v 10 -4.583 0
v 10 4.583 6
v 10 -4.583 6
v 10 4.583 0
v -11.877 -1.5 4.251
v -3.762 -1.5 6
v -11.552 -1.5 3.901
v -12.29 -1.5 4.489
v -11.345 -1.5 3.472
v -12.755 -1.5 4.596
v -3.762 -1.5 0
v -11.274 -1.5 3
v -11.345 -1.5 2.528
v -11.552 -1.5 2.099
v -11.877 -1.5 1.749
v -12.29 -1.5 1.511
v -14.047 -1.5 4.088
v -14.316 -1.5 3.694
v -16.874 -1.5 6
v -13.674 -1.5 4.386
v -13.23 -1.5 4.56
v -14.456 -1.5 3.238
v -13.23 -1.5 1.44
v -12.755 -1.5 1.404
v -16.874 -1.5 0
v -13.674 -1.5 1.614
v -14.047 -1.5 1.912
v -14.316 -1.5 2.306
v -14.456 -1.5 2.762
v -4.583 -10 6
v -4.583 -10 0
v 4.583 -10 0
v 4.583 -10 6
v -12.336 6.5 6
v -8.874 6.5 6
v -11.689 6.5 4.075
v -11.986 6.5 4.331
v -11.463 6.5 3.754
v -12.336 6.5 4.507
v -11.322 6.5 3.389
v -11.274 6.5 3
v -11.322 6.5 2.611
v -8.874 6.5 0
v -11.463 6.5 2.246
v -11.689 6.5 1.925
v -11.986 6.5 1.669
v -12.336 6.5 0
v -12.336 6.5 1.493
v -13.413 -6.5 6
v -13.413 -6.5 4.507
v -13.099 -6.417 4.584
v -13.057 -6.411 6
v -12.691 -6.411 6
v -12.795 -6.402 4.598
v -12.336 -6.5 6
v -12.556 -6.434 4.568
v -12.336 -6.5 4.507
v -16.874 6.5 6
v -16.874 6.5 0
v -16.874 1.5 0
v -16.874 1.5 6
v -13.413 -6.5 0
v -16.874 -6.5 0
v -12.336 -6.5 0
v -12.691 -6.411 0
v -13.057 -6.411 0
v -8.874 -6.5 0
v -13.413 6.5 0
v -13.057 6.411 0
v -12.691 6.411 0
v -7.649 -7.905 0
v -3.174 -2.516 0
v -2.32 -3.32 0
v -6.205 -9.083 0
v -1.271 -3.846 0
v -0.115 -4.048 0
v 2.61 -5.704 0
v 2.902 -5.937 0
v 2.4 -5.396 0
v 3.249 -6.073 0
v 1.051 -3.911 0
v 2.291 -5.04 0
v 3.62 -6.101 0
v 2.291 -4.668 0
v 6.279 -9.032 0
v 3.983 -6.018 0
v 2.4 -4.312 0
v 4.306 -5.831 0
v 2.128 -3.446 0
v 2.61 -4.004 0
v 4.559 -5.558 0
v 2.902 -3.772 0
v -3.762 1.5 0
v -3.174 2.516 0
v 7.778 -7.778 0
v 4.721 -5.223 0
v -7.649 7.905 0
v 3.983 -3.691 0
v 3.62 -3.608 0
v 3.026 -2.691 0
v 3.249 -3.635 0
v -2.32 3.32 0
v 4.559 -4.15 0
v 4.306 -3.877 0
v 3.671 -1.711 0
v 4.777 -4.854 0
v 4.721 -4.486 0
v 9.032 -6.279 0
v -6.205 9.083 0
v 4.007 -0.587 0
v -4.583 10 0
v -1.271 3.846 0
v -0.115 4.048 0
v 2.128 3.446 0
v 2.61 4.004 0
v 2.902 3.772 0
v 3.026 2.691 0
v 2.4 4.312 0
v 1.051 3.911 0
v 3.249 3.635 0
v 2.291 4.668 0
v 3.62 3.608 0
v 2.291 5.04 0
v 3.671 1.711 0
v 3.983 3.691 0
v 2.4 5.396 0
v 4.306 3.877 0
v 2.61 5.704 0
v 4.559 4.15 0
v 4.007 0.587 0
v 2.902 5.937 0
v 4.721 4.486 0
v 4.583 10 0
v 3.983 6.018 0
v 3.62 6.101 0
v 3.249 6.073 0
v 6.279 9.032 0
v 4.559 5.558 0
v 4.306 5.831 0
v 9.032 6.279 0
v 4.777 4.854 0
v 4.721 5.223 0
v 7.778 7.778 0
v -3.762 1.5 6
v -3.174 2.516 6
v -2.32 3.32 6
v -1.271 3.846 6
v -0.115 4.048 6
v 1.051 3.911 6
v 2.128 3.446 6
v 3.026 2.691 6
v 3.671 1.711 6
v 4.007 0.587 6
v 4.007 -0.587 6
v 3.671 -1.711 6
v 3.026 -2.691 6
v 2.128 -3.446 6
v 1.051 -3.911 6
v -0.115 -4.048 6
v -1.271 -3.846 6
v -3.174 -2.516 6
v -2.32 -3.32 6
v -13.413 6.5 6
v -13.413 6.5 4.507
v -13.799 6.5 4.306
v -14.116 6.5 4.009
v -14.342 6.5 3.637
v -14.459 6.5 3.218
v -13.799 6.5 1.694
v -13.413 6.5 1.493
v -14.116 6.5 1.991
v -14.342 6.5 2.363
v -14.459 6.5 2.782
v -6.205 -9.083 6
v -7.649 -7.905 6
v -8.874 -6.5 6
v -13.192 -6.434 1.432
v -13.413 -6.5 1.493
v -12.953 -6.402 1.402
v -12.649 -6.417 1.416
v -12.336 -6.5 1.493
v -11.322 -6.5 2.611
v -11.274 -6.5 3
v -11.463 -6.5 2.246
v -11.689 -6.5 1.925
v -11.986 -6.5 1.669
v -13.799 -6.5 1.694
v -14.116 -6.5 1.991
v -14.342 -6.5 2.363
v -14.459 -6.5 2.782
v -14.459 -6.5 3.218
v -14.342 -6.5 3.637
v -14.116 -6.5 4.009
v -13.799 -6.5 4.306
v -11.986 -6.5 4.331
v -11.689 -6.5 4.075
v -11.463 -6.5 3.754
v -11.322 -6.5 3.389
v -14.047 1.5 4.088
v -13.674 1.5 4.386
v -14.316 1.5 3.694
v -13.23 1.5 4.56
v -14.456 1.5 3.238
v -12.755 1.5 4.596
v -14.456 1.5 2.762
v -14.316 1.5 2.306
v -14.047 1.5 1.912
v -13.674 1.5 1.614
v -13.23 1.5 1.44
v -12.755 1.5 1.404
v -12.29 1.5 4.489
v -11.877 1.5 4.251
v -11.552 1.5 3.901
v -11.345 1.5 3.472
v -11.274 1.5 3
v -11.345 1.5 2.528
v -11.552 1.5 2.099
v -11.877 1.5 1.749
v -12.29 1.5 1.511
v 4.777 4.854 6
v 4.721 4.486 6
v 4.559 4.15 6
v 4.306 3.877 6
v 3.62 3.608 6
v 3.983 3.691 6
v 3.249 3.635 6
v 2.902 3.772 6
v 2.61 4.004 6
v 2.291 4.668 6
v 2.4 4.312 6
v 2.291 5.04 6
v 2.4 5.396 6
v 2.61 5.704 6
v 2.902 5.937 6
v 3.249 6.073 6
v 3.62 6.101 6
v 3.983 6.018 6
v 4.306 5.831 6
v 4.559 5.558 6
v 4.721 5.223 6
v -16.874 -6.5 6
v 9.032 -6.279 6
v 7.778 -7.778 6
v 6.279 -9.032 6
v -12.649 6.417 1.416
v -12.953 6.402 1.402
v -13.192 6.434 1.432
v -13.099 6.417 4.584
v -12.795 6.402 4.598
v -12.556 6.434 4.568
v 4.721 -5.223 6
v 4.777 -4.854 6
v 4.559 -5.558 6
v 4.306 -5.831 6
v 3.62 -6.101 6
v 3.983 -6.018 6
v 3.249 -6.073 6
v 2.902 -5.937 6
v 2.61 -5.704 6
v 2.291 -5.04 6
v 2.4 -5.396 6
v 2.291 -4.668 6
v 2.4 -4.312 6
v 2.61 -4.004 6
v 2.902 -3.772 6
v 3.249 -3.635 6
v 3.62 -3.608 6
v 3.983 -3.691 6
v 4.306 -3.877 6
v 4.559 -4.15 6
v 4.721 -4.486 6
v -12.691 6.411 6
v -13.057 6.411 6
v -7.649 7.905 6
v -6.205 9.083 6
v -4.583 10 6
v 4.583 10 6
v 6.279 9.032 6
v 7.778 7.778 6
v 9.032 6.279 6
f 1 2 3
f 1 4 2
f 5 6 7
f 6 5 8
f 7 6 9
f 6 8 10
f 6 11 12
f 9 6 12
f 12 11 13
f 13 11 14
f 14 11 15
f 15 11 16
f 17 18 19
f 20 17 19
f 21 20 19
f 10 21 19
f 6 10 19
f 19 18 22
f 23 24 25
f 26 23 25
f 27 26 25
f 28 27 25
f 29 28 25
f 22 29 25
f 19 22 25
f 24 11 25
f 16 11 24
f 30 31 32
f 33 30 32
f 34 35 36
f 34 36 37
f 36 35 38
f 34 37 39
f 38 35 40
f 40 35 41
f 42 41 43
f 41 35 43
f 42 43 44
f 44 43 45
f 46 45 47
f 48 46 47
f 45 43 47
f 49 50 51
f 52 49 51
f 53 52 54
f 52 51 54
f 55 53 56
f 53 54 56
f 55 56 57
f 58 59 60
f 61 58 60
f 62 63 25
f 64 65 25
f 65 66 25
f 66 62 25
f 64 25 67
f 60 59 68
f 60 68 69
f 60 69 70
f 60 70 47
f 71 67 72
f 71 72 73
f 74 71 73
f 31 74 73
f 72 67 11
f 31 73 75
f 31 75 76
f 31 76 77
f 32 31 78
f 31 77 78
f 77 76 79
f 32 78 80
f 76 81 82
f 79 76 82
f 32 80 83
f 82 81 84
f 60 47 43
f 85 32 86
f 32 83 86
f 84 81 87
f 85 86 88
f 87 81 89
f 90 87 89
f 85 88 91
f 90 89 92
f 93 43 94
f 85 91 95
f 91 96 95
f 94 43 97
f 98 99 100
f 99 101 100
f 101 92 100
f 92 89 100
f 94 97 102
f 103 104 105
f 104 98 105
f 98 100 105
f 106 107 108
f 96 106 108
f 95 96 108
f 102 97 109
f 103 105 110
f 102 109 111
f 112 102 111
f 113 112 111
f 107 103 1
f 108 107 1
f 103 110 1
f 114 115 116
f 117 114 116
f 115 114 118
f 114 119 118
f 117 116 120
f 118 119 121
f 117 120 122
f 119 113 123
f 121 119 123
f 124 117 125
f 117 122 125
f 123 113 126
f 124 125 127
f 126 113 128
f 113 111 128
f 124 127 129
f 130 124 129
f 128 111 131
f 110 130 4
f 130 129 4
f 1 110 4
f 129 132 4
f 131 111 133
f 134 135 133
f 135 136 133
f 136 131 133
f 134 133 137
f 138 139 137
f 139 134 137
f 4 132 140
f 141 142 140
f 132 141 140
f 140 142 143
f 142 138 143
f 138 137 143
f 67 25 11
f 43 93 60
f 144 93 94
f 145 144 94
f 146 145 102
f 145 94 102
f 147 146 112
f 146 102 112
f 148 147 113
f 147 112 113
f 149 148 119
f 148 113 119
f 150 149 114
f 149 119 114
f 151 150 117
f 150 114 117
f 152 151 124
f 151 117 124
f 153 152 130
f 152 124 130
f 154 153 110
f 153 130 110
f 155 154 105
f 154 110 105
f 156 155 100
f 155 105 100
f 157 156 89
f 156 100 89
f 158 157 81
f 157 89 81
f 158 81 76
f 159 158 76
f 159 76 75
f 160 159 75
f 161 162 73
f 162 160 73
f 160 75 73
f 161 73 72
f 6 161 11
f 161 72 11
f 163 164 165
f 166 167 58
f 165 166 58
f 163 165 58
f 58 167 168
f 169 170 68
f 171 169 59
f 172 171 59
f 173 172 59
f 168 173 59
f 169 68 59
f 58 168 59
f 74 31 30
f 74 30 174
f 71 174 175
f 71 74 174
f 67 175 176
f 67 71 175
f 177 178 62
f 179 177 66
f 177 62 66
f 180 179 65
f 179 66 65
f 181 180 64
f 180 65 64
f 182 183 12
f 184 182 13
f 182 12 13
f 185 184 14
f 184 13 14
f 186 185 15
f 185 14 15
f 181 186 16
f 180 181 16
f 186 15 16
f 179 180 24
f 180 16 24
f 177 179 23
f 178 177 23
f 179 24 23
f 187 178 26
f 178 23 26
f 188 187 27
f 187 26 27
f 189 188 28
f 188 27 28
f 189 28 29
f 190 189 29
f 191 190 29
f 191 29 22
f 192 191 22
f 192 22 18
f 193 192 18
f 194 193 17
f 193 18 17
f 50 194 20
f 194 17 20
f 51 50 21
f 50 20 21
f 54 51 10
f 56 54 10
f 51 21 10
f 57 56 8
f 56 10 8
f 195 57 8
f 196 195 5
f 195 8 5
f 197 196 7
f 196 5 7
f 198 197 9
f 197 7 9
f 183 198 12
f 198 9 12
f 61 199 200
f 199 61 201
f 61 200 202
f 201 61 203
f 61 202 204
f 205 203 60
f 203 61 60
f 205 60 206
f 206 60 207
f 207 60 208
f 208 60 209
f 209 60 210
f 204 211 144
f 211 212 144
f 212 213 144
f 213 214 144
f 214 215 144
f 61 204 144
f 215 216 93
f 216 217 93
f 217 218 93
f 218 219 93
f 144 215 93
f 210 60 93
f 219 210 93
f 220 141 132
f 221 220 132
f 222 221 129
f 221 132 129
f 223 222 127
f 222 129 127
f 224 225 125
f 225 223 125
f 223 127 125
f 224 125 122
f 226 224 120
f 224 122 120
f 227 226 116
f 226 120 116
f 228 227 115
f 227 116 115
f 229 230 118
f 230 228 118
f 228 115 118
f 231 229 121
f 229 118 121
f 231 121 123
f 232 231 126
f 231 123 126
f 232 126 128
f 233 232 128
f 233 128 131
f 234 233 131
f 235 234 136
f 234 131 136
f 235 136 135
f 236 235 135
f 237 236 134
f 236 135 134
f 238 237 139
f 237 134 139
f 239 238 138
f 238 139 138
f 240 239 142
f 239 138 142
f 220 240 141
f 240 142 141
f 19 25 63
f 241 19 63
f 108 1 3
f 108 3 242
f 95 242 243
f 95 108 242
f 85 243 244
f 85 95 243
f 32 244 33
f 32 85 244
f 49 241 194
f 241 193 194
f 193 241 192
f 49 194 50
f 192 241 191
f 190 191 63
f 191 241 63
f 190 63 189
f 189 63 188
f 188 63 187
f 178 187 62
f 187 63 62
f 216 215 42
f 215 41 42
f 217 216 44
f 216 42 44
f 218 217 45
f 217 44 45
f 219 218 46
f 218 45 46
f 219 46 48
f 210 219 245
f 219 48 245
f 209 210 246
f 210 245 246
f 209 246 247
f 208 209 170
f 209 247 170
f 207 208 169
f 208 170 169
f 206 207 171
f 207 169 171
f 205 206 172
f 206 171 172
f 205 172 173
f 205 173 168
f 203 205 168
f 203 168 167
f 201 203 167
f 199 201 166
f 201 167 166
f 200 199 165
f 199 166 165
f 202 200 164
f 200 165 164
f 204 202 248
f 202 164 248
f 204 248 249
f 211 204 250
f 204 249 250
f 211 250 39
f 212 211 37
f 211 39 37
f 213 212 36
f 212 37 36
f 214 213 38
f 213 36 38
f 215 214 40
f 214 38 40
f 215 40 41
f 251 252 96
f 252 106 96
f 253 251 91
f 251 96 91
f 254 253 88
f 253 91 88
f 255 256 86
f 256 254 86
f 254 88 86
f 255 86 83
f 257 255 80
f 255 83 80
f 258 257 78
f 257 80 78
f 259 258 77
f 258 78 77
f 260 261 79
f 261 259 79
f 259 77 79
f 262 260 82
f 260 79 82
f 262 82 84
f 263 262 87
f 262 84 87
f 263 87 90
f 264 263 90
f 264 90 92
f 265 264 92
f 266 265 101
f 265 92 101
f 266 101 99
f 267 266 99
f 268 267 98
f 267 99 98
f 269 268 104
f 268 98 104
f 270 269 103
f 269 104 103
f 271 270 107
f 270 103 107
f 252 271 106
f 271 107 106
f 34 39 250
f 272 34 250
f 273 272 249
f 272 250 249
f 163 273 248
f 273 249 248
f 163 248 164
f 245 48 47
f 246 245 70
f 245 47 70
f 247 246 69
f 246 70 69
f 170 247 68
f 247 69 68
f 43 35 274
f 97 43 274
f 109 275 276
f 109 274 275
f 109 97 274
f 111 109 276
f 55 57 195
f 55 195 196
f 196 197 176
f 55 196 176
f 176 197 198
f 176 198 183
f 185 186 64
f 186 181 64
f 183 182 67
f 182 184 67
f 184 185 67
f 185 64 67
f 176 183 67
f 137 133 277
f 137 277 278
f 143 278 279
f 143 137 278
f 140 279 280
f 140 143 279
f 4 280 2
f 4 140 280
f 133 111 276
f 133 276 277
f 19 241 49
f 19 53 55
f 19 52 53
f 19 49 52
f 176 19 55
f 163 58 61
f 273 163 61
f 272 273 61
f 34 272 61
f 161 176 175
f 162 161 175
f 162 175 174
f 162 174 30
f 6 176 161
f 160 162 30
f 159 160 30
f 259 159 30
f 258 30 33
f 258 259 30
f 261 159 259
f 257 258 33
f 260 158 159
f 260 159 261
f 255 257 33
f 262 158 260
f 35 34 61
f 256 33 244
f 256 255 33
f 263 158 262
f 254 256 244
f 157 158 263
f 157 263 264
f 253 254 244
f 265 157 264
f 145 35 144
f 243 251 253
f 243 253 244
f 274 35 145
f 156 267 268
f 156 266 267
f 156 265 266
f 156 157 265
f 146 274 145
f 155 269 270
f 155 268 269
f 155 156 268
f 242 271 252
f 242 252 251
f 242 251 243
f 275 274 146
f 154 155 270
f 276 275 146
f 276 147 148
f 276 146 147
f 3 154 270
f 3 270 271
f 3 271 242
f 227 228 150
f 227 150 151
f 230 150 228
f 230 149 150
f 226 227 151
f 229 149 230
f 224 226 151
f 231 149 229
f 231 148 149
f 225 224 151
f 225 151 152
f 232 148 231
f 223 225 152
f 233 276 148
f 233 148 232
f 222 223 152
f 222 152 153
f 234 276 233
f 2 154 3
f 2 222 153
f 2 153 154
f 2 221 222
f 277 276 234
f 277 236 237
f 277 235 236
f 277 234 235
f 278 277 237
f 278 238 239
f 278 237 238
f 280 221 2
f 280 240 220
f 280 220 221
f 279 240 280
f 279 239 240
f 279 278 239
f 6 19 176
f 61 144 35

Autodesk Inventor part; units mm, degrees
ref_plane "YZ Plane" through (0, 0, 0) normal (1, 0, 0) x (0, 1, 0)
ref_plane "XZ Plane" through (0, 0, 0) normal (0, 1, 0) x (-1, 0, 0)
ref_plane "XY Plane" through (0, 0, 0) normal (0, 0, 1) x (1, 0, 0)
sketch "スケッチ1" plane through (0, 0, 0) normal (0, 0, 1) x (1, 0, 0)
  circle A0 centre (3.5267, 4.8541) radius 1.25
  circle A1 centre (3.5267, -4.8541) radius 1.25
  line L0 (3.5267, 4.8541) -> (0, 0) construction
  line L1 (0, 0) -> (3.5267, -4.8541) construction
  line L2 (0, 0) -> (7.2054, 0) construction
  circle A2 centre (0, 0) radius 4.05
  arc A3 (-8.8741, 6.5) -> (-8.8741, -6.5) centre (0, 0) ccw construction
  line L3 (-8.8741, 6.5) -> (-12.3356, 6.5)
  line L4 (-16.8741, 6.5) -> (-16.8741, 1.5)
  line L5 (-16.8741, 1.5) -> (-3.762, 1.5)
  line L6 (-3.762, -1.5) -> (-16.8741, -1.5)
  line L7 (-16.8741, -1.5) -> (-16.8741, -6.5)
  line L8 (-16.8741, -6.5) -> (-13.4126, -6.5)
  line L9 (-4.5826, 10) -> (4.5826, 10)
  line L10 (-4.5826, -10) -> (4.5826, -10)
  line L11 (10, 4.5826) -> (10, -4.5826)
  circle A4 centre (0, 0) radius 10 construction
  arc A5 (-12.3356, 6.5) -> (-13.4126, 6.5) centre (-12.8741, 7.9) ccw construction
  arc A6 (-12.3356, -6.5) -> (-13.4126, -6.5) centre (-12.8741, -7.9) ccw
  arc A7 (-4.5826, 10) -> (-8.8741, 6.5) centre (0, 0) ccw
  arc A8 (4.5826, 10) -> (-4.5826, 10) centre (0, 0) ccw construction
  arc A9 (10, 4.5826) -> (4.5826, 10) centre (0, 0) ccw
  arc A10 (10, -4.5826) -> (10, 4.5826) centre (0, 0) ccw construction
  arc A11 (4.5826, -10) -> (10, -4.5826) centre (0, 0) ccw
  arc A12 (-4.5826, -10) -> (4.5826, -10) centre (0, 0) ccw construction
  arc A13 (-8.8741, -6.5) -> (-4.5826, -10) centre (0, 0) ccw
  arc A14 (-13.4126, 6.5) -> (-12.3356, 6.5) centre (-12.8741, 7.9) ccw
  line L12 (-13.4126, 6.5) -> (-16.8741, 6.5)
  line L13 (-12.3356, 6.5) -> (-13.4126, 6.5) construction
  arc A15 (-13.4126, -6.5) -> (-12.3356, -6.5) centre (-12.8741, -7.9) ccw construction
  line L14 (-13.4126, -6.5) -> (-12.3356, -6.5) construction
  line L15 (-12.3356, -6.5) -> (-8.8741, -6.5)
  dimension "d0" = 2.5
  dimension "d1" = 2.5
  dimension "d2" = 6
  dimension "d3" = 6
  dimension "d4" = 108
  dimension "d5" = 54
  dimension "d6" = 8.1
  dimension "d7" = 22
  dimension "d8" = 5
  dimension "d9" = 5
  dimension "d10" = 20
  dimension "d11" = 3
  dimension "d12" = 1.5
  dimension "d13" = 8
  dimension "d14" = 3
  dimension "d15" = 3
  dimension "d16" = 1.4
  dimension "d17" = 1.4
  dimension "d18" = 4
  dimension "d19" = 4
extrude "押し出し1" add sketch "スケッチ1" along normal blind 6 contours A2 L5 L4 L12 A14 L3 A7 L9 A9 L11 A11 L10 A13 L15 A6 L8 L7 L6
sketch "スケッチ2" plane through (-16.8741, 6.5, 0) normal (0, 1, 0) x (1, 0, 0)
  circle A0 centre (4, -3) radius 1.6
  line L0 (4.5385, 0) -> (3.4615, 0) projected
  point P0 (16.8741, 0)
  point P1 (4, 0)
  dimension "d22" = 3.2
  dimension "d23" = 3
extrude "押し出し2" cut sketch "スケッチ2" against normal through all
equation "\"d5\" = 0.5 * d4"
equation "\"d12\" = 0.5 * d11"
properties part number "ギア固定具1"
